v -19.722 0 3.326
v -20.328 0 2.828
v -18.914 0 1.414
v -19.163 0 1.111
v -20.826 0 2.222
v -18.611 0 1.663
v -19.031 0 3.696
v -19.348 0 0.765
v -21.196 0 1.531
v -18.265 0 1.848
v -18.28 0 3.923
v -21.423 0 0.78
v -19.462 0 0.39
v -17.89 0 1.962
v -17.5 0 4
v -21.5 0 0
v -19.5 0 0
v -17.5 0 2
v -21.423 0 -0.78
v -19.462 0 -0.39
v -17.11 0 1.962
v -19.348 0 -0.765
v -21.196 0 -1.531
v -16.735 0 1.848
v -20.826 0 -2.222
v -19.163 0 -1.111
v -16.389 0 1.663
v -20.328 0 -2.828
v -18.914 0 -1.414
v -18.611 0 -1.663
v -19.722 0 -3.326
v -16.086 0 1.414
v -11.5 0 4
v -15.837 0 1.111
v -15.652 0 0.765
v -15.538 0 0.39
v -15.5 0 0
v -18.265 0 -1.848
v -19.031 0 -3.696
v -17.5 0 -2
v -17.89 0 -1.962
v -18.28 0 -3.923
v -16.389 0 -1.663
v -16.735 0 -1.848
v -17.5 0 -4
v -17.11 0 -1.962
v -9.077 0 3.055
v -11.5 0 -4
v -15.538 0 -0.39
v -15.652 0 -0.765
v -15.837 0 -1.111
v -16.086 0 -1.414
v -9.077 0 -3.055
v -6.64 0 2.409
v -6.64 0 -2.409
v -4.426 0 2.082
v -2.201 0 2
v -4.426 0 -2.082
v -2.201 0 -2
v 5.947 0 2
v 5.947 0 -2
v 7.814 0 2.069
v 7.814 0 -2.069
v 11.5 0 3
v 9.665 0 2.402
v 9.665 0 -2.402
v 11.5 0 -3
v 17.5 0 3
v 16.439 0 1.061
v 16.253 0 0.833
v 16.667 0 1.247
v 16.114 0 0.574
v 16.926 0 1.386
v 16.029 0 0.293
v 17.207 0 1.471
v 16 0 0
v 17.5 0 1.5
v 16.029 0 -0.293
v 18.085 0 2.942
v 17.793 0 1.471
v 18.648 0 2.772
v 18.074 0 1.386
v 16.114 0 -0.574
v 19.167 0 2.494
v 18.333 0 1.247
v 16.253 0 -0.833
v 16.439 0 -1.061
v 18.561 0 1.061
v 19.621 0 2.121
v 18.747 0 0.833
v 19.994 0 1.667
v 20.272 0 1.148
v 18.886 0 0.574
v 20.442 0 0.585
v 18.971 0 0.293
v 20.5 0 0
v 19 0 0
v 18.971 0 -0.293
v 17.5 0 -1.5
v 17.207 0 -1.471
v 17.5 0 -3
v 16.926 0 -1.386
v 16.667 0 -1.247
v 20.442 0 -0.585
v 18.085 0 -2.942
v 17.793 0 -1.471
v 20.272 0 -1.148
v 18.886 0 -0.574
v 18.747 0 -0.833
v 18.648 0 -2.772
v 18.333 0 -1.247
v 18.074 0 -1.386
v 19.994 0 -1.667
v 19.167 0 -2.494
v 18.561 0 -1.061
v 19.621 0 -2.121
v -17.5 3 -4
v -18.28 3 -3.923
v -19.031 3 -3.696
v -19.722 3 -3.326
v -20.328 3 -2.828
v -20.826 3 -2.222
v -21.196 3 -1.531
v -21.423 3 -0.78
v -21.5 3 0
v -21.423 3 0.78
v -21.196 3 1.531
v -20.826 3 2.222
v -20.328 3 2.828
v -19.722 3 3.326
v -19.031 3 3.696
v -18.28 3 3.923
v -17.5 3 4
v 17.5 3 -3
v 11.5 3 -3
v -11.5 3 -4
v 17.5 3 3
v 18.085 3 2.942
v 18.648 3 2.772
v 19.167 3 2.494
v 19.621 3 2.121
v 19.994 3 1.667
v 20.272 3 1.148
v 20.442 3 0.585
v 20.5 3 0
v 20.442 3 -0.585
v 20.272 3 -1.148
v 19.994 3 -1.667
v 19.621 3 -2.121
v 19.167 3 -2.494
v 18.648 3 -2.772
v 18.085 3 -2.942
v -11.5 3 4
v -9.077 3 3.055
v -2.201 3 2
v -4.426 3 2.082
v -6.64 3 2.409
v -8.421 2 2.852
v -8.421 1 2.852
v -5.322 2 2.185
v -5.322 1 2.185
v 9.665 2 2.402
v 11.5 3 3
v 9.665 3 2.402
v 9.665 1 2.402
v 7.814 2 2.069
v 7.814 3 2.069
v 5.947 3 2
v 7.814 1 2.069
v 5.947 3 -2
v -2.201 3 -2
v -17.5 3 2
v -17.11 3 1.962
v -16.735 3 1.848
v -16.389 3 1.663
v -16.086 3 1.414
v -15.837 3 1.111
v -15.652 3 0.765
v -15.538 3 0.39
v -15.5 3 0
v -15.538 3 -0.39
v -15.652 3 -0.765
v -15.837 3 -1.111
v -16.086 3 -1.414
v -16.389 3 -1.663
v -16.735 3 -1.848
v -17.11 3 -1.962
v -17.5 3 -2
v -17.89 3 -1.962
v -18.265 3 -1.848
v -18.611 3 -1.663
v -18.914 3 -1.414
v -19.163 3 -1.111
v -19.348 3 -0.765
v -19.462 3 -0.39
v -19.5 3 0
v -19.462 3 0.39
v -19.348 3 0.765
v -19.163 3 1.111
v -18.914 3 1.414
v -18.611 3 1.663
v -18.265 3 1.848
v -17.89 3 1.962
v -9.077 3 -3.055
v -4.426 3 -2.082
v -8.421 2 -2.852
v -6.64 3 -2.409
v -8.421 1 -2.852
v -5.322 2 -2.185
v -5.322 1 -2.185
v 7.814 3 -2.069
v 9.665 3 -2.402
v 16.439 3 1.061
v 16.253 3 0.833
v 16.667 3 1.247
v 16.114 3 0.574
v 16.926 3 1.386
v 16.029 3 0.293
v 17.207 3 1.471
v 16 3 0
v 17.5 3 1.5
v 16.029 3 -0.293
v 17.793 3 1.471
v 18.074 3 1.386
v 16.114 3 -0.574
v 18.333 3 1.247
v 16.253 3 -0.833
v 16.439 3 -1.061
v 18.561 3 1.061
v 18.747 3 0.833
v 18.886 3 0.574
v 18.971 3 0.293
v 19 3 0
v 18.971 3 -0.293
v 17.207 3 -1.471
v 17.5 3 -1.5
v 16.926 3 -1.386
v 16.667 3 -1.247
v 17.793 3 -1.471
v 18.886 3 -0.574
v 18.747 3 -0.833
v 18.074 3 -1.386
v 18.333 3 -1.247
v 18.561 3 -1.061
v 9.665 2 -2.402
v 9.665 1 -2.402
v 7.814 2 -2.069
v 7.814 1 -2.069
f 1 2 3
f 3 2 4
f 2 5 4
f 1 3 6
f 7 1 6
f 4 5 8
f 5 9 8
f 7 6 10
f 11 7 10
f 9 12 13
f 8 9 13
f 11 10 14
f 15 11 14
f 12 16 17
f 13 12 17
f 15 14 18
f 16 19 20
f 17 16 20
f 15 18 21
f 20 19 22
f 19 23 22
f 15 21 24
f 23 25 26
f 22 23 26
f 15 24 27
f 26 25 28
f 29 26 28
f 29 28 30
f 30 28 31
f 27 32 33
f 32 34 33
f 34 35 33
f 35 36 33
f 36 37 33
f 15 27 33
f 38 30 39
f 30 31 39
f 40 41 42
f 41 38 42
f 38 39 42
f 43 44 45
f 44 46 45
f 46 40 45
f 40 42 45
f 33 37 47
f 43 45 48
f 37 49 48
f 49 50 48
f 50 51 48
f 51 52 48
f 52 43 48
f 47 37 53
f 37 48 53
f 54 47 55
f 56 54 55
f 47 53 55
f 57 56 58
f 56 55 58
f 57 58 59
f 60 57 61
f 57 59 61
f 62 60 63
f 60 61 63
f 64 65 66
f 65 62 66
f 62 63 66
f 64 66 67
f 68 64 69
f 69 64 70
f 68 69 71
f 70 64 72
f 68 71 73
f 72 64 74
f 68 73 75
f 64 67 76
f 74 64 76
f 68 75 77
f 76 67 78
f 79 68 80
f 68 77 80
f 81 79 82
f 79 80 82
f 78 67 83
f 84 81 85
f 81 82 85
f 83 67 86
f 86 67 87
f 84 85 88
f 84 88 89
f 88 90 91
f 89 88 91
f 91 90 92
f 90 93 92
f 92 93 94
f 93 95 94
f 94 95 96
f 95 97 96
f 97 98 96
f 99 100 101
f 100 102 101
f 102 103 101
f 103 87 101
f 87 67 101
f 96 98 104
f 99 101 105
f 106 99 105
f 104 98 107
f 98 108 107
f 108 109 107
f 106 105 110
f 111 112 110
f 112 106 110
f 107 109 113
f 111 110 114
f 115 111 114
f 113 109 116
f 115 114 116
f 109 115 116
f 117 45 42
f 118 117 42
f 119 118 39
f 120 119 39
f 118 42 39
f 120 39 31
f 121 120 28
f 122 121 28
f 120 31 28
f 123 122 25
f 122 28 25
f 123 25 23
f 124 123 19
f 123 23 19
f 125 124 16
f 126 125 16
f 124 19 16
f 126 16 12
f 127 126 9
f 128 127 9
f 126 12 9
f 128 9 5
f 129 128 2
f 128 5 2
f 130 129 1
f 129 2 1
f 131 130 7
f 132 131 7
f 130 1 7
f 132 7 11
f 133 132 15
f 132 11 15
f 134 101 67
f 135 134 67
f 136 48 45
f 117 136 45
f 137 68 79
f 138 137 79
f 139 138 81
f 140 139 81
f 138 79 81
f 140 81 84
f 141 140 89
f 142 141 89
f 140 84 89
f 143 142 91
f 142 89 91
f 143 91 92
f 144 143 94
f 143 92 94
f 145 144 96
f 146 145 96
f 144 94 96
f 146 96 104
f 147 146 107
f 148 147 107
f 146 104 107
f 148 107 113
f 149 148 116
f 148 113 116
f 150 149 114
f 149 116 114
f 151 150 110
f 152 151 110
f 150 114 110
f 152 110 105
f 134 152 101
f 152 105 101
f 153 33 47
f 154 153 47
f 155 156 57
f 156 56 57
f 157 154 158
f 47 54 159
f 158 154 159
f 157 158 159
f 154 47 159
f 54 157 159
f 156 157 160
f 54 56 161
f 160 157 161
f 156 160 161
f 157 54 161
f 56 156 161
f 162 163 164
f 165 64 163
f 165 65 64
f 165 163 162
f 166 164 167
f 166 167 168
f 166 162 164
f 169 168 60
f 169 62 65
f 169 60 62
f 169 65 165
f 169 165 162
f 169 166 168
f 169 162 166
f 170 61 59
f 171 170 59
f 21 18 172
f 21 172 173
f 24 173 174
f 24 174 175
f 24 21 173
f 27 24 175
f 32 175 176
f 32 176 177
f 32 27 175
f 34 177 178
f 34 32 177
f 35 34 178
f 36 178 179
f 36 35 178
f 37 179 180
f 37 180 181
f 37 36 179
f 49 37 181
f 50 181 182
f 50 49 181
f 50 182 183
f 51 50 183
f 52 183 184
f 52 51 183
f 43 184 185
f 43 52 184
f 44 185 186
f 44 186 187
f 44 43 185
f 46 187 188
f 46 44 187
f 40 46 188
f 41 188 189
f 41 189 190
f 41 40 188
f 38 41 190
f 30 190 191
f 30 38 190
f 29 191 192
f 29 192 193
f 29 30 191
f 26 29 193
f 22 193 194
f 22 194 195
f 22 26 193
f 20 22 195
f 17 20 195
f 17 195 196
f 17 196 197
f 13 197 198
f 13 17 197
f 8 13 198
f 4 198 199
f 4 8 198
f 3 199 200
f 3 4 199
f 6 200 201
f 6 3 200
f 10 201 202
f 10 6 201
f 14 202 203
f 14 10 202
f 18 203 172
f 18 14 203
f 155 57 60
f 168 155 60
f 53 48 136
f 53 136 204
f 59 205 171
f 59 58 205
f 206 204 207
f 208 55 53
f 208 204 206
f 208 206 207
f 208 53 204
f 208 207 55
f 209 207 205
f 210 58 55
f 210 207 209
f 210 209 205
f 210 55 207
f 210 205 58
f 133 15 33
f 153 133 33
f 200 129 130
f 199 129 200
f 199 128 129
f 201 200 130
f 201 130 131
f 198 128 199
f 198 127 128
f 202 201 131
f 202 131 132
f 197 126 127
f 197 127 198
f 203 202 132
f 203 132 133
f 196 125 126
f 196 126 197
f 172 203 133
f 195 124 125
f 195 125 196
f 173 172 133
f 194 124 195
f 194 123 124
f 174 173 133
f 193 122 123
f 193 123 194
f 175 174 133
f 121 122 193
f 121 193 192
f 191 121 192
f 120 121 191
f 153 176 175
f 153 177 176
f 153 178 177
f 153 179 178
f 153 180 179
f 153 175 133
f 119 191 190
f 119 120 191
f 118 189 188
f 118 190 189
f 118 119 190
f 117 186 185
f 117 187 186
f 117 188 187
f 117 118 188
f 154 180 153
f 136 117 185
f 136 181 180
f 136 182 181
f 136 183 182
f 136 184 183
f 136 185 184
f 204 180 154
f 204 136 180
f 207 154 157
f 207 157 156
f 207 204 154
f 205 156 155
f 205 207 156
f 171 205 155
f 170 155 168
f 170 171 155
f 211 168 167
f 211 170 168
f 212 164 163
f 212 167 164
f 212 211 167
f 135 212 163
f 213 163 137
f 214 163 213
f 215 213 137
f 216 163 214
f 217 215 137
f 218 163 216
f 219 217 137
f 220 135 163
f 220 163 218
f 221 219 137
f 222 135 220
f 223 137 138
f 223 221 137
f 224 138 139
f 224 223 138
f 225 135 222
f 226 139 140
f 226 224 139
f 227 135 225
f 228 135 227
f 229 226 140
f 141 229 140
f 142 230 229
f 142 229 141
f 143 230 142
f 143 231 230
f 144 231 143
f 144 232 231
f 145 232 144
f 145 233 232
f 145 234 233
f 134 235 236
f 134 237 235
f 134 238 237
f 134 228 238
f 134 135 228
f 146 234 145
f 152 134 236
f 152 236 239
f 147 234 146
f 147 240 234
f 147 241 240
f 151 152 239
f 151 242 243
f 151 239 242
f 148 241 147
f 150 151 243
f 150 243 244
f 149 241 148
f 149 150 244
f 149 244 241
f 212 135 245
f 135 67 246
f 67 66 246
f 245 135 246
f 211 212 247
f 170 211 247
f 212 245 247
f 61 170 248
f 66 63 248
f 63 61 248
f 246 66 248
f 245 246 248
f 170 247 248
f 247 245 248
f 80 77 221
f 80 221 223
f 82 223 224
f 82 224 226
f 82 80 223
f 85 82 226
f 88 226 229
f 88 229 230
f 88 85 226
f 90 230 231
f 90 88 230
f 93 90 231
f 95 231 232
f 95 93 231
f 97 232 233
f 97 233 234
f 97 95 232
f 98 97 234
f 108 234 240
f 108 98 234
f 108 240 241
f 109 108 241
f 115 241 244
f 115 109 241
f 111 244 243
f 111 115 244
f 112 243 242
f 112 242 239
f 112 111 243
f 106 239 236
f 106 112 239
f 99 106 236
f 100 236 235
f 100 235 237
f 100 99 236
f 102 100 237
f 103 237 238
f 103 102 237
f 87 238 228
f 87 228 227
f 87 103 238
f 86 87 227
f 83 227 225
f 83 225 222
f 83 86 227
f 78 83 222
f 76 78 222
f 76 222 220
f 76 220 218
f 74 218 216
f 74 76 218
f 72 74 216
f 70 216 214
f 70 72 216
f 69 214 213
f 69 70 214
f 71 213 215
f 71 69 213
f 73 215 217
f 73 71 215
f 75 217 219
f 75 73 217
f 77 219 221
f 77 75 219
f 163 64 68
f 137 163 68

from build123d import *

# Parameters (mm, degrees)
SKETCH1_R           = 2
SKETCH1_R_2         = 1.5
BOSS_EXTRUDE1_DEPTH = 3


with BuildPart() as part:
    # Sketch1 → Boss-Extrude1 (new body)
    with BuildSketch(Plane(origin=(0, 0, 0), x_dir=(1, 0, 0), z_dir=(0, 1, 0))):
        with BuildLine():
            Line((-17.5, -4), (-11.5, -4))
            add(Edge.make_bspline(
                [(-11.5, -4), (-8.431864047, -2.610600203), (-5.332163957, -1.943933537), (-2.200899734, -2)],
                knots=[0, 0, 0, 0, 0.616300928, 0.616300928, 0.616300928, 0.616300928], degree=3))
            Line((-2.200899734, -2), (5.947351403, -2))
            add(Edge.make_bspline(
                [(11.5, -3), (9.673149322, -2.269768842), (7.822266456, -1.936435509), (5.947351403, -2)],
                knots=[0, 0, 0, 0, 0.698718256, 0.698718256, 0.698718256, 0.698718256], degree=3))
            Line((11.5, -3), (17.5, -3))
            ThreePointArc((17.5, -3), (20.5, 0), (17.5, 3))
            Line((17.5, 3), (11.5, 3))
            add(Edge.make_bspline(
                [(11.5, 3), (9.673149322, 2.269768842), (7.822266456, 1.936435509), (5.947351403, 2)],
                knots=[0, 0, 0, 0, 0.698718256, 0.698718256, 0.698718256, 0.698718256], degree=3))
            Line((5.947351403, 2), (-2.200899734, 2))
            add(Edge.make_bspline(
                [(-11.5, 4), (-8.431864047, 2.610600203), (-5.332163957, 1.943933537), (-2.200899734, 2)],
                knots=[0, 0, 0, 0, 0.616300928, 0.616300928, 0.616300928, 0.616300928], degree=3))
            Line((-11.5, 4), (-17.5, 4))
            ThreePointArc((-17.5, 4), (-21.5, 0), (-17.5, -4))
        make_face()
        with Locations(Location((-17.5, 0, 0), (0, 0, 270))):
            Circle(SKETCH1_R, mode=Mode.SUBTRACT)
        with Locations(Location((17.5, 0, 0), (0, 0, 270))):
            Circle(SKETCH1_R_2, mode=Mode.SUBTRACT)
    extrude(amount=BOSS_EXTRUDE1_DEPTH)


solid = part.part
